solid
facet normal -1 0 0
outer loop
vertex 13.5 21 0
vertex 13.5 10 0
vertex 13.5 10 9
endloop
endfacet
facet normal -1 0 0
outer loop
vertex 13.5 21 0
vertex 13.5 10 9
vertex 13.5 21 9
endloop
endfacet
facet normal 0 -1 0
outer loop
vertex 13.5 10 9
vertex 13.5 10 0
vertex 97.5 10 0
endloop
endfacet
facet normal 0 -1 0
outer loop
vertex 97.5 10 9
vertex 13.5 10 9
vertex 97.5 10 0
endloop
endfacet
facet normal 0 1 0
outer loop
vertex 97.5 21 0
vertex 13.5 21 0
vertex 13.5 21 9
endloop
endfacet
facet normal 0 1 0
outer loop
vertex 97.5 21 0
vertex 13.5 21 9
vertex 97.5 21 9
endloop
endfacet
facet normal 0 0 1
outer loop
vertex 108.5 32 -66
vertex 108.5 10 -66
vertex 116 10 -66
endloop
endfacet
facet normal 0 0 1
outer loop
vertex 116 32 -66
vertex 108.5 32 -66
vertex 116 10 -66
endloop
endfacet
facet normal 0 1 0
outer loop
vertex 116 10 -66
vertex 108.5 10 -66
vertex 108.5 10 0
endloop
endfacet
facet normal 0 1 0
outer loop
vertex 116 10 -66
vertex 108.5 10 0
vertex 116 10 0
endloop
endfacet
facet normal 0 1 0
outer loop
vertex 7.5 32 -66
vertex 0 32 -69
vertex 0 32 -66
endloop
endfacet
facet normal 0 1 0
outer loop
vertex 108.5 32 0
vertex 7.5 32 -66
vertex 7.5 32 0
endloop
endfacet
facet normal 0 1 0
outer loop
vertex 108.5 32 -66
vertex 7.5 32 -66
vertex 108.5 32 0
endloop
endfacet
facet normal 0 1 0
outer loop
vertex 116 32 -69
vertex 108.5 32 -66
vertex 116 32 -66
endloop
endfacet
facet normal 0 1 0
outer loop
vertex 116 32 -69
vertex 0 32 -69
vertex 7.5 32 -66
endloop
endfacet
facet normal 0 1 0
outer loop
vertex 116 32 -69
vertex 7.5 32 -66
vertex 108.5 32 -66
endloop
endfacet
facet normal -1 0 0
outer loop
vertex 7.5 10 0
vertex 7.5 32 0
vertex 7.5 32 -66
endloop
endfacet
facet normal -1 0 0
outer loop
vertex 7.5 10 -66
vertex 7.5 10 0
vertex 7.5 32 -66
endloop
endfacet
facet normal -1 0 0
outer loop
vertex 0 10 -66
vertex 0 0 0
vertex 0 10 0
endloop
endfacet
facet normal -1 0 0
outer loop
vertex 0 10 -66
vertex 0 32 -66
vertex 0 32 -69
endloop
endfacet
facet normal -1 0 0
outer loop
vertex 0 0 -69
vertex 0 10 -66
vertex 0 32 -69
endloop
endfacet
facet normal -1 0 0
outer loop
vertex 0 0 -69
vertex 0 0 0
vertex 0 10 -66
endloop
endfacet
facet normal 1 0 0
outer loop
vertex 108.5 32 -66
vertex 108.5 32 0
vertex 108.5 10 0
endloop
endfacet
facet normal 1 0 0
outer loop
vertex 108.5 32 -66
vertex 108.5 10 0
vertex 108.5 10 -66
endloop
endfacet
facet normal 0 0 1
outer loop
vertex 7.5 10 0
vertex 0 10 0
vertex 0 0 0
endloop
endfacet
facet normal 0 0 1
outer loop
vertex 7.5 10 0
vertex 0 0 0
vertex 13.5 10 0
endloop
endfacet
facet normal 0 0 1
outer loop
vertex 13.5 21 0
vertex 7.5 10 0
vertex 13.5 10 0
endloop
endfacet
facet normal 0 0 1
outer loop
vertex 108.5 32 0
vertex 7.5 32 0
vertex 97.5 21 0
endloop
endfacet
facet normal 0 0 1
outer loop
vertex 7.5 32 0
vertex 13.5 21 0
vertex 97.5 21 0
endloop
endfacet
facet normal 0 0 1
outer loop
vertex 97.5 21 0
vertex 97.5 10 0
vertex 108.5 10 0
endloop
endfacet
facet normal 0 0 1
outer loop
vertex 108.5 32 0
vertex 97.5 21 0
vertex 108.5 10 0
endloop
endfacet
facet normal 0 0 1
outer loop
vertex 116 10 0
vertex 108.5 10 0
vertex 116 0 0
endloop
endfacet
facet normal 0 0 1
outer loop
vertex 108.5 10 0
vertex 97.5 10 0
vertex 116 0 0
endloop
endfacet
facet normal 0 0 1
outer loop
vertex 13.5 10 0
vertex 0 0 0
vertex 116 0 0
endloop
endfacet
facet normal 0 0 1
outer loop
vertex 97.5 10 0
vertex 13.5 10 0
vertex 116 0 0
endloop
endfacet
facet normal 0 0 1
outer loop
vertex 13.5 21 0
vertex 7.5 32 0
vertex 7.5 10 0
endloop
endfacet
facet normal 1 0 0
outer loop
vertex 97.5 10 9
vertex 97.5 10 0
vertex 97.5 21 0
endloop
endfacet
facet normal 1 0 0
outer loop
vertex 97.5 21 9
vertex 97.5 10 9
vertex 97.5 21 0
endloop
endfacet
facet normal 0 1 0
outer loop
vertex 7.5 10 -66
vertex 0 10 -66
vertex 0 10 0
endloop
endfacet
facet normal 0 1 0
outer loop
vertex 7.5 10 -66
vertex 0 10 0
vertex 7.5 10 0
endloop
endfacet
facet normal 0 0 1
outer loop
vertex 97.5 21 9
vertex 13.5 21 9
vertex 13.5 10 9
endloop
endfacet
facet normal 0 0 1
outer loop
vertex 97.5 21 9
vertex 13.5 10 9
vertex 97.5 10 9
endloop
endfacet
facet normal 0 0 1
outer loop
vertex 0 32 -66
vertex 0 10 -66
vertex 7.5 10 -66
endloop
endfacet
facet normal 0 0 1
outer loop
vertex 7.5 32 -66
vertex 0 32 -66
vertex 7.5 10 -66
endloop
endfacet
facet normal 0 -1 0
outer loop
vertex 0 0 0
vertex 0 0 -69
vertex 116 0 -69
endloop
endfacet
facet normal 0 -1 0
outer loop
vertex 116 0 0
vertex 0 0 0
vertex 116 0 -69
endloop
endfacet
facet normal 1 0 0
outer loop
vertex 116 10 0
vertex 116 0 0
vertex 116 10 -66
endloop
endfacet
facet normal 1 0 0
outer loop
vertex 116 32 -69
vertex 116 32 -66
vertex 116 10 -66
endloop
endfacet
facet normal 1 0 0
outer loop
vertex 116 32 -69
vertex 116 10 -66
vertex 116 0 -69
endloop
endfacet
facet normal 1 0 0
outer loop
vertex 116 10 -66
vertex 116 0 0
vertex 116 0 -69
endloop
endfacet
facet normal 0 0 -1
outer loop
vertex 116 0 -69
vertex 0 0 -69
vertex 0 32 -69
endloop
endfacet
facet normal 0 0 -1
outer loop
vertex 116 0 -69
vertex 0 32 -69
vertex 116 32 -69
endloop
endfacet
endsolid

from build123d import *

# Parameters (mm, degrees)
SKETCH_1_W          = 116
SKETCH_1_H          = 69
EXTRUDE_1_DEPTH     = 32
SKETCH_2_W          = 7.5
SKETCH_2_H          = 66
CUT_EXTRUDE_1_DEPTH = 22
SKETCH_3_W          = 84
SKETCH_3_H          = 11
EXTRUDE_2_DEPTH     = 9


with BuildPart() as part:
    # 草图1 → 凸台-拉伸1 (new body)
    with BuildSketch(Plane(origin=(0, 0, 0), x_dir=(1, 0, 0), z_dir=(0, 1, 0))):
        with Locations((58, 34.5)):
            Rectangle(SKETCH_1_W, SKETCH_1_H)
    extrude(amount=EXTRUDE_1_DEPTH)

    # 草图2 → 切除-拉伸1 (cut)
    with BuildSketch(Plane(origin=(0, 32, 0), x_dir=(1, 0, 0), z_dir=(0, 1, 0))):
        with Locations((112.25, 33)):
            Rectangle(SKETCH_2_W, SKETCH_2_H)
        with Locations((3.75, 33)):
            Rectangle(SKETCH_2_W, SKETCH_2_H)
    extrude(amount=-CUT_EXTRUDE_1_DEPTH, mode=Mode.SUBTRACT)

    # 草图3 → 凸台-拉伸2 (add)
    with BuildSketch(Plane.XY):
        with Locations((55.5, 15.5)):
            Rectangle(SKETCH_3_W, SKETCH_3_H)
    extrude(amount=EXTRUDE_2_DEPTH)


solid = part.part
